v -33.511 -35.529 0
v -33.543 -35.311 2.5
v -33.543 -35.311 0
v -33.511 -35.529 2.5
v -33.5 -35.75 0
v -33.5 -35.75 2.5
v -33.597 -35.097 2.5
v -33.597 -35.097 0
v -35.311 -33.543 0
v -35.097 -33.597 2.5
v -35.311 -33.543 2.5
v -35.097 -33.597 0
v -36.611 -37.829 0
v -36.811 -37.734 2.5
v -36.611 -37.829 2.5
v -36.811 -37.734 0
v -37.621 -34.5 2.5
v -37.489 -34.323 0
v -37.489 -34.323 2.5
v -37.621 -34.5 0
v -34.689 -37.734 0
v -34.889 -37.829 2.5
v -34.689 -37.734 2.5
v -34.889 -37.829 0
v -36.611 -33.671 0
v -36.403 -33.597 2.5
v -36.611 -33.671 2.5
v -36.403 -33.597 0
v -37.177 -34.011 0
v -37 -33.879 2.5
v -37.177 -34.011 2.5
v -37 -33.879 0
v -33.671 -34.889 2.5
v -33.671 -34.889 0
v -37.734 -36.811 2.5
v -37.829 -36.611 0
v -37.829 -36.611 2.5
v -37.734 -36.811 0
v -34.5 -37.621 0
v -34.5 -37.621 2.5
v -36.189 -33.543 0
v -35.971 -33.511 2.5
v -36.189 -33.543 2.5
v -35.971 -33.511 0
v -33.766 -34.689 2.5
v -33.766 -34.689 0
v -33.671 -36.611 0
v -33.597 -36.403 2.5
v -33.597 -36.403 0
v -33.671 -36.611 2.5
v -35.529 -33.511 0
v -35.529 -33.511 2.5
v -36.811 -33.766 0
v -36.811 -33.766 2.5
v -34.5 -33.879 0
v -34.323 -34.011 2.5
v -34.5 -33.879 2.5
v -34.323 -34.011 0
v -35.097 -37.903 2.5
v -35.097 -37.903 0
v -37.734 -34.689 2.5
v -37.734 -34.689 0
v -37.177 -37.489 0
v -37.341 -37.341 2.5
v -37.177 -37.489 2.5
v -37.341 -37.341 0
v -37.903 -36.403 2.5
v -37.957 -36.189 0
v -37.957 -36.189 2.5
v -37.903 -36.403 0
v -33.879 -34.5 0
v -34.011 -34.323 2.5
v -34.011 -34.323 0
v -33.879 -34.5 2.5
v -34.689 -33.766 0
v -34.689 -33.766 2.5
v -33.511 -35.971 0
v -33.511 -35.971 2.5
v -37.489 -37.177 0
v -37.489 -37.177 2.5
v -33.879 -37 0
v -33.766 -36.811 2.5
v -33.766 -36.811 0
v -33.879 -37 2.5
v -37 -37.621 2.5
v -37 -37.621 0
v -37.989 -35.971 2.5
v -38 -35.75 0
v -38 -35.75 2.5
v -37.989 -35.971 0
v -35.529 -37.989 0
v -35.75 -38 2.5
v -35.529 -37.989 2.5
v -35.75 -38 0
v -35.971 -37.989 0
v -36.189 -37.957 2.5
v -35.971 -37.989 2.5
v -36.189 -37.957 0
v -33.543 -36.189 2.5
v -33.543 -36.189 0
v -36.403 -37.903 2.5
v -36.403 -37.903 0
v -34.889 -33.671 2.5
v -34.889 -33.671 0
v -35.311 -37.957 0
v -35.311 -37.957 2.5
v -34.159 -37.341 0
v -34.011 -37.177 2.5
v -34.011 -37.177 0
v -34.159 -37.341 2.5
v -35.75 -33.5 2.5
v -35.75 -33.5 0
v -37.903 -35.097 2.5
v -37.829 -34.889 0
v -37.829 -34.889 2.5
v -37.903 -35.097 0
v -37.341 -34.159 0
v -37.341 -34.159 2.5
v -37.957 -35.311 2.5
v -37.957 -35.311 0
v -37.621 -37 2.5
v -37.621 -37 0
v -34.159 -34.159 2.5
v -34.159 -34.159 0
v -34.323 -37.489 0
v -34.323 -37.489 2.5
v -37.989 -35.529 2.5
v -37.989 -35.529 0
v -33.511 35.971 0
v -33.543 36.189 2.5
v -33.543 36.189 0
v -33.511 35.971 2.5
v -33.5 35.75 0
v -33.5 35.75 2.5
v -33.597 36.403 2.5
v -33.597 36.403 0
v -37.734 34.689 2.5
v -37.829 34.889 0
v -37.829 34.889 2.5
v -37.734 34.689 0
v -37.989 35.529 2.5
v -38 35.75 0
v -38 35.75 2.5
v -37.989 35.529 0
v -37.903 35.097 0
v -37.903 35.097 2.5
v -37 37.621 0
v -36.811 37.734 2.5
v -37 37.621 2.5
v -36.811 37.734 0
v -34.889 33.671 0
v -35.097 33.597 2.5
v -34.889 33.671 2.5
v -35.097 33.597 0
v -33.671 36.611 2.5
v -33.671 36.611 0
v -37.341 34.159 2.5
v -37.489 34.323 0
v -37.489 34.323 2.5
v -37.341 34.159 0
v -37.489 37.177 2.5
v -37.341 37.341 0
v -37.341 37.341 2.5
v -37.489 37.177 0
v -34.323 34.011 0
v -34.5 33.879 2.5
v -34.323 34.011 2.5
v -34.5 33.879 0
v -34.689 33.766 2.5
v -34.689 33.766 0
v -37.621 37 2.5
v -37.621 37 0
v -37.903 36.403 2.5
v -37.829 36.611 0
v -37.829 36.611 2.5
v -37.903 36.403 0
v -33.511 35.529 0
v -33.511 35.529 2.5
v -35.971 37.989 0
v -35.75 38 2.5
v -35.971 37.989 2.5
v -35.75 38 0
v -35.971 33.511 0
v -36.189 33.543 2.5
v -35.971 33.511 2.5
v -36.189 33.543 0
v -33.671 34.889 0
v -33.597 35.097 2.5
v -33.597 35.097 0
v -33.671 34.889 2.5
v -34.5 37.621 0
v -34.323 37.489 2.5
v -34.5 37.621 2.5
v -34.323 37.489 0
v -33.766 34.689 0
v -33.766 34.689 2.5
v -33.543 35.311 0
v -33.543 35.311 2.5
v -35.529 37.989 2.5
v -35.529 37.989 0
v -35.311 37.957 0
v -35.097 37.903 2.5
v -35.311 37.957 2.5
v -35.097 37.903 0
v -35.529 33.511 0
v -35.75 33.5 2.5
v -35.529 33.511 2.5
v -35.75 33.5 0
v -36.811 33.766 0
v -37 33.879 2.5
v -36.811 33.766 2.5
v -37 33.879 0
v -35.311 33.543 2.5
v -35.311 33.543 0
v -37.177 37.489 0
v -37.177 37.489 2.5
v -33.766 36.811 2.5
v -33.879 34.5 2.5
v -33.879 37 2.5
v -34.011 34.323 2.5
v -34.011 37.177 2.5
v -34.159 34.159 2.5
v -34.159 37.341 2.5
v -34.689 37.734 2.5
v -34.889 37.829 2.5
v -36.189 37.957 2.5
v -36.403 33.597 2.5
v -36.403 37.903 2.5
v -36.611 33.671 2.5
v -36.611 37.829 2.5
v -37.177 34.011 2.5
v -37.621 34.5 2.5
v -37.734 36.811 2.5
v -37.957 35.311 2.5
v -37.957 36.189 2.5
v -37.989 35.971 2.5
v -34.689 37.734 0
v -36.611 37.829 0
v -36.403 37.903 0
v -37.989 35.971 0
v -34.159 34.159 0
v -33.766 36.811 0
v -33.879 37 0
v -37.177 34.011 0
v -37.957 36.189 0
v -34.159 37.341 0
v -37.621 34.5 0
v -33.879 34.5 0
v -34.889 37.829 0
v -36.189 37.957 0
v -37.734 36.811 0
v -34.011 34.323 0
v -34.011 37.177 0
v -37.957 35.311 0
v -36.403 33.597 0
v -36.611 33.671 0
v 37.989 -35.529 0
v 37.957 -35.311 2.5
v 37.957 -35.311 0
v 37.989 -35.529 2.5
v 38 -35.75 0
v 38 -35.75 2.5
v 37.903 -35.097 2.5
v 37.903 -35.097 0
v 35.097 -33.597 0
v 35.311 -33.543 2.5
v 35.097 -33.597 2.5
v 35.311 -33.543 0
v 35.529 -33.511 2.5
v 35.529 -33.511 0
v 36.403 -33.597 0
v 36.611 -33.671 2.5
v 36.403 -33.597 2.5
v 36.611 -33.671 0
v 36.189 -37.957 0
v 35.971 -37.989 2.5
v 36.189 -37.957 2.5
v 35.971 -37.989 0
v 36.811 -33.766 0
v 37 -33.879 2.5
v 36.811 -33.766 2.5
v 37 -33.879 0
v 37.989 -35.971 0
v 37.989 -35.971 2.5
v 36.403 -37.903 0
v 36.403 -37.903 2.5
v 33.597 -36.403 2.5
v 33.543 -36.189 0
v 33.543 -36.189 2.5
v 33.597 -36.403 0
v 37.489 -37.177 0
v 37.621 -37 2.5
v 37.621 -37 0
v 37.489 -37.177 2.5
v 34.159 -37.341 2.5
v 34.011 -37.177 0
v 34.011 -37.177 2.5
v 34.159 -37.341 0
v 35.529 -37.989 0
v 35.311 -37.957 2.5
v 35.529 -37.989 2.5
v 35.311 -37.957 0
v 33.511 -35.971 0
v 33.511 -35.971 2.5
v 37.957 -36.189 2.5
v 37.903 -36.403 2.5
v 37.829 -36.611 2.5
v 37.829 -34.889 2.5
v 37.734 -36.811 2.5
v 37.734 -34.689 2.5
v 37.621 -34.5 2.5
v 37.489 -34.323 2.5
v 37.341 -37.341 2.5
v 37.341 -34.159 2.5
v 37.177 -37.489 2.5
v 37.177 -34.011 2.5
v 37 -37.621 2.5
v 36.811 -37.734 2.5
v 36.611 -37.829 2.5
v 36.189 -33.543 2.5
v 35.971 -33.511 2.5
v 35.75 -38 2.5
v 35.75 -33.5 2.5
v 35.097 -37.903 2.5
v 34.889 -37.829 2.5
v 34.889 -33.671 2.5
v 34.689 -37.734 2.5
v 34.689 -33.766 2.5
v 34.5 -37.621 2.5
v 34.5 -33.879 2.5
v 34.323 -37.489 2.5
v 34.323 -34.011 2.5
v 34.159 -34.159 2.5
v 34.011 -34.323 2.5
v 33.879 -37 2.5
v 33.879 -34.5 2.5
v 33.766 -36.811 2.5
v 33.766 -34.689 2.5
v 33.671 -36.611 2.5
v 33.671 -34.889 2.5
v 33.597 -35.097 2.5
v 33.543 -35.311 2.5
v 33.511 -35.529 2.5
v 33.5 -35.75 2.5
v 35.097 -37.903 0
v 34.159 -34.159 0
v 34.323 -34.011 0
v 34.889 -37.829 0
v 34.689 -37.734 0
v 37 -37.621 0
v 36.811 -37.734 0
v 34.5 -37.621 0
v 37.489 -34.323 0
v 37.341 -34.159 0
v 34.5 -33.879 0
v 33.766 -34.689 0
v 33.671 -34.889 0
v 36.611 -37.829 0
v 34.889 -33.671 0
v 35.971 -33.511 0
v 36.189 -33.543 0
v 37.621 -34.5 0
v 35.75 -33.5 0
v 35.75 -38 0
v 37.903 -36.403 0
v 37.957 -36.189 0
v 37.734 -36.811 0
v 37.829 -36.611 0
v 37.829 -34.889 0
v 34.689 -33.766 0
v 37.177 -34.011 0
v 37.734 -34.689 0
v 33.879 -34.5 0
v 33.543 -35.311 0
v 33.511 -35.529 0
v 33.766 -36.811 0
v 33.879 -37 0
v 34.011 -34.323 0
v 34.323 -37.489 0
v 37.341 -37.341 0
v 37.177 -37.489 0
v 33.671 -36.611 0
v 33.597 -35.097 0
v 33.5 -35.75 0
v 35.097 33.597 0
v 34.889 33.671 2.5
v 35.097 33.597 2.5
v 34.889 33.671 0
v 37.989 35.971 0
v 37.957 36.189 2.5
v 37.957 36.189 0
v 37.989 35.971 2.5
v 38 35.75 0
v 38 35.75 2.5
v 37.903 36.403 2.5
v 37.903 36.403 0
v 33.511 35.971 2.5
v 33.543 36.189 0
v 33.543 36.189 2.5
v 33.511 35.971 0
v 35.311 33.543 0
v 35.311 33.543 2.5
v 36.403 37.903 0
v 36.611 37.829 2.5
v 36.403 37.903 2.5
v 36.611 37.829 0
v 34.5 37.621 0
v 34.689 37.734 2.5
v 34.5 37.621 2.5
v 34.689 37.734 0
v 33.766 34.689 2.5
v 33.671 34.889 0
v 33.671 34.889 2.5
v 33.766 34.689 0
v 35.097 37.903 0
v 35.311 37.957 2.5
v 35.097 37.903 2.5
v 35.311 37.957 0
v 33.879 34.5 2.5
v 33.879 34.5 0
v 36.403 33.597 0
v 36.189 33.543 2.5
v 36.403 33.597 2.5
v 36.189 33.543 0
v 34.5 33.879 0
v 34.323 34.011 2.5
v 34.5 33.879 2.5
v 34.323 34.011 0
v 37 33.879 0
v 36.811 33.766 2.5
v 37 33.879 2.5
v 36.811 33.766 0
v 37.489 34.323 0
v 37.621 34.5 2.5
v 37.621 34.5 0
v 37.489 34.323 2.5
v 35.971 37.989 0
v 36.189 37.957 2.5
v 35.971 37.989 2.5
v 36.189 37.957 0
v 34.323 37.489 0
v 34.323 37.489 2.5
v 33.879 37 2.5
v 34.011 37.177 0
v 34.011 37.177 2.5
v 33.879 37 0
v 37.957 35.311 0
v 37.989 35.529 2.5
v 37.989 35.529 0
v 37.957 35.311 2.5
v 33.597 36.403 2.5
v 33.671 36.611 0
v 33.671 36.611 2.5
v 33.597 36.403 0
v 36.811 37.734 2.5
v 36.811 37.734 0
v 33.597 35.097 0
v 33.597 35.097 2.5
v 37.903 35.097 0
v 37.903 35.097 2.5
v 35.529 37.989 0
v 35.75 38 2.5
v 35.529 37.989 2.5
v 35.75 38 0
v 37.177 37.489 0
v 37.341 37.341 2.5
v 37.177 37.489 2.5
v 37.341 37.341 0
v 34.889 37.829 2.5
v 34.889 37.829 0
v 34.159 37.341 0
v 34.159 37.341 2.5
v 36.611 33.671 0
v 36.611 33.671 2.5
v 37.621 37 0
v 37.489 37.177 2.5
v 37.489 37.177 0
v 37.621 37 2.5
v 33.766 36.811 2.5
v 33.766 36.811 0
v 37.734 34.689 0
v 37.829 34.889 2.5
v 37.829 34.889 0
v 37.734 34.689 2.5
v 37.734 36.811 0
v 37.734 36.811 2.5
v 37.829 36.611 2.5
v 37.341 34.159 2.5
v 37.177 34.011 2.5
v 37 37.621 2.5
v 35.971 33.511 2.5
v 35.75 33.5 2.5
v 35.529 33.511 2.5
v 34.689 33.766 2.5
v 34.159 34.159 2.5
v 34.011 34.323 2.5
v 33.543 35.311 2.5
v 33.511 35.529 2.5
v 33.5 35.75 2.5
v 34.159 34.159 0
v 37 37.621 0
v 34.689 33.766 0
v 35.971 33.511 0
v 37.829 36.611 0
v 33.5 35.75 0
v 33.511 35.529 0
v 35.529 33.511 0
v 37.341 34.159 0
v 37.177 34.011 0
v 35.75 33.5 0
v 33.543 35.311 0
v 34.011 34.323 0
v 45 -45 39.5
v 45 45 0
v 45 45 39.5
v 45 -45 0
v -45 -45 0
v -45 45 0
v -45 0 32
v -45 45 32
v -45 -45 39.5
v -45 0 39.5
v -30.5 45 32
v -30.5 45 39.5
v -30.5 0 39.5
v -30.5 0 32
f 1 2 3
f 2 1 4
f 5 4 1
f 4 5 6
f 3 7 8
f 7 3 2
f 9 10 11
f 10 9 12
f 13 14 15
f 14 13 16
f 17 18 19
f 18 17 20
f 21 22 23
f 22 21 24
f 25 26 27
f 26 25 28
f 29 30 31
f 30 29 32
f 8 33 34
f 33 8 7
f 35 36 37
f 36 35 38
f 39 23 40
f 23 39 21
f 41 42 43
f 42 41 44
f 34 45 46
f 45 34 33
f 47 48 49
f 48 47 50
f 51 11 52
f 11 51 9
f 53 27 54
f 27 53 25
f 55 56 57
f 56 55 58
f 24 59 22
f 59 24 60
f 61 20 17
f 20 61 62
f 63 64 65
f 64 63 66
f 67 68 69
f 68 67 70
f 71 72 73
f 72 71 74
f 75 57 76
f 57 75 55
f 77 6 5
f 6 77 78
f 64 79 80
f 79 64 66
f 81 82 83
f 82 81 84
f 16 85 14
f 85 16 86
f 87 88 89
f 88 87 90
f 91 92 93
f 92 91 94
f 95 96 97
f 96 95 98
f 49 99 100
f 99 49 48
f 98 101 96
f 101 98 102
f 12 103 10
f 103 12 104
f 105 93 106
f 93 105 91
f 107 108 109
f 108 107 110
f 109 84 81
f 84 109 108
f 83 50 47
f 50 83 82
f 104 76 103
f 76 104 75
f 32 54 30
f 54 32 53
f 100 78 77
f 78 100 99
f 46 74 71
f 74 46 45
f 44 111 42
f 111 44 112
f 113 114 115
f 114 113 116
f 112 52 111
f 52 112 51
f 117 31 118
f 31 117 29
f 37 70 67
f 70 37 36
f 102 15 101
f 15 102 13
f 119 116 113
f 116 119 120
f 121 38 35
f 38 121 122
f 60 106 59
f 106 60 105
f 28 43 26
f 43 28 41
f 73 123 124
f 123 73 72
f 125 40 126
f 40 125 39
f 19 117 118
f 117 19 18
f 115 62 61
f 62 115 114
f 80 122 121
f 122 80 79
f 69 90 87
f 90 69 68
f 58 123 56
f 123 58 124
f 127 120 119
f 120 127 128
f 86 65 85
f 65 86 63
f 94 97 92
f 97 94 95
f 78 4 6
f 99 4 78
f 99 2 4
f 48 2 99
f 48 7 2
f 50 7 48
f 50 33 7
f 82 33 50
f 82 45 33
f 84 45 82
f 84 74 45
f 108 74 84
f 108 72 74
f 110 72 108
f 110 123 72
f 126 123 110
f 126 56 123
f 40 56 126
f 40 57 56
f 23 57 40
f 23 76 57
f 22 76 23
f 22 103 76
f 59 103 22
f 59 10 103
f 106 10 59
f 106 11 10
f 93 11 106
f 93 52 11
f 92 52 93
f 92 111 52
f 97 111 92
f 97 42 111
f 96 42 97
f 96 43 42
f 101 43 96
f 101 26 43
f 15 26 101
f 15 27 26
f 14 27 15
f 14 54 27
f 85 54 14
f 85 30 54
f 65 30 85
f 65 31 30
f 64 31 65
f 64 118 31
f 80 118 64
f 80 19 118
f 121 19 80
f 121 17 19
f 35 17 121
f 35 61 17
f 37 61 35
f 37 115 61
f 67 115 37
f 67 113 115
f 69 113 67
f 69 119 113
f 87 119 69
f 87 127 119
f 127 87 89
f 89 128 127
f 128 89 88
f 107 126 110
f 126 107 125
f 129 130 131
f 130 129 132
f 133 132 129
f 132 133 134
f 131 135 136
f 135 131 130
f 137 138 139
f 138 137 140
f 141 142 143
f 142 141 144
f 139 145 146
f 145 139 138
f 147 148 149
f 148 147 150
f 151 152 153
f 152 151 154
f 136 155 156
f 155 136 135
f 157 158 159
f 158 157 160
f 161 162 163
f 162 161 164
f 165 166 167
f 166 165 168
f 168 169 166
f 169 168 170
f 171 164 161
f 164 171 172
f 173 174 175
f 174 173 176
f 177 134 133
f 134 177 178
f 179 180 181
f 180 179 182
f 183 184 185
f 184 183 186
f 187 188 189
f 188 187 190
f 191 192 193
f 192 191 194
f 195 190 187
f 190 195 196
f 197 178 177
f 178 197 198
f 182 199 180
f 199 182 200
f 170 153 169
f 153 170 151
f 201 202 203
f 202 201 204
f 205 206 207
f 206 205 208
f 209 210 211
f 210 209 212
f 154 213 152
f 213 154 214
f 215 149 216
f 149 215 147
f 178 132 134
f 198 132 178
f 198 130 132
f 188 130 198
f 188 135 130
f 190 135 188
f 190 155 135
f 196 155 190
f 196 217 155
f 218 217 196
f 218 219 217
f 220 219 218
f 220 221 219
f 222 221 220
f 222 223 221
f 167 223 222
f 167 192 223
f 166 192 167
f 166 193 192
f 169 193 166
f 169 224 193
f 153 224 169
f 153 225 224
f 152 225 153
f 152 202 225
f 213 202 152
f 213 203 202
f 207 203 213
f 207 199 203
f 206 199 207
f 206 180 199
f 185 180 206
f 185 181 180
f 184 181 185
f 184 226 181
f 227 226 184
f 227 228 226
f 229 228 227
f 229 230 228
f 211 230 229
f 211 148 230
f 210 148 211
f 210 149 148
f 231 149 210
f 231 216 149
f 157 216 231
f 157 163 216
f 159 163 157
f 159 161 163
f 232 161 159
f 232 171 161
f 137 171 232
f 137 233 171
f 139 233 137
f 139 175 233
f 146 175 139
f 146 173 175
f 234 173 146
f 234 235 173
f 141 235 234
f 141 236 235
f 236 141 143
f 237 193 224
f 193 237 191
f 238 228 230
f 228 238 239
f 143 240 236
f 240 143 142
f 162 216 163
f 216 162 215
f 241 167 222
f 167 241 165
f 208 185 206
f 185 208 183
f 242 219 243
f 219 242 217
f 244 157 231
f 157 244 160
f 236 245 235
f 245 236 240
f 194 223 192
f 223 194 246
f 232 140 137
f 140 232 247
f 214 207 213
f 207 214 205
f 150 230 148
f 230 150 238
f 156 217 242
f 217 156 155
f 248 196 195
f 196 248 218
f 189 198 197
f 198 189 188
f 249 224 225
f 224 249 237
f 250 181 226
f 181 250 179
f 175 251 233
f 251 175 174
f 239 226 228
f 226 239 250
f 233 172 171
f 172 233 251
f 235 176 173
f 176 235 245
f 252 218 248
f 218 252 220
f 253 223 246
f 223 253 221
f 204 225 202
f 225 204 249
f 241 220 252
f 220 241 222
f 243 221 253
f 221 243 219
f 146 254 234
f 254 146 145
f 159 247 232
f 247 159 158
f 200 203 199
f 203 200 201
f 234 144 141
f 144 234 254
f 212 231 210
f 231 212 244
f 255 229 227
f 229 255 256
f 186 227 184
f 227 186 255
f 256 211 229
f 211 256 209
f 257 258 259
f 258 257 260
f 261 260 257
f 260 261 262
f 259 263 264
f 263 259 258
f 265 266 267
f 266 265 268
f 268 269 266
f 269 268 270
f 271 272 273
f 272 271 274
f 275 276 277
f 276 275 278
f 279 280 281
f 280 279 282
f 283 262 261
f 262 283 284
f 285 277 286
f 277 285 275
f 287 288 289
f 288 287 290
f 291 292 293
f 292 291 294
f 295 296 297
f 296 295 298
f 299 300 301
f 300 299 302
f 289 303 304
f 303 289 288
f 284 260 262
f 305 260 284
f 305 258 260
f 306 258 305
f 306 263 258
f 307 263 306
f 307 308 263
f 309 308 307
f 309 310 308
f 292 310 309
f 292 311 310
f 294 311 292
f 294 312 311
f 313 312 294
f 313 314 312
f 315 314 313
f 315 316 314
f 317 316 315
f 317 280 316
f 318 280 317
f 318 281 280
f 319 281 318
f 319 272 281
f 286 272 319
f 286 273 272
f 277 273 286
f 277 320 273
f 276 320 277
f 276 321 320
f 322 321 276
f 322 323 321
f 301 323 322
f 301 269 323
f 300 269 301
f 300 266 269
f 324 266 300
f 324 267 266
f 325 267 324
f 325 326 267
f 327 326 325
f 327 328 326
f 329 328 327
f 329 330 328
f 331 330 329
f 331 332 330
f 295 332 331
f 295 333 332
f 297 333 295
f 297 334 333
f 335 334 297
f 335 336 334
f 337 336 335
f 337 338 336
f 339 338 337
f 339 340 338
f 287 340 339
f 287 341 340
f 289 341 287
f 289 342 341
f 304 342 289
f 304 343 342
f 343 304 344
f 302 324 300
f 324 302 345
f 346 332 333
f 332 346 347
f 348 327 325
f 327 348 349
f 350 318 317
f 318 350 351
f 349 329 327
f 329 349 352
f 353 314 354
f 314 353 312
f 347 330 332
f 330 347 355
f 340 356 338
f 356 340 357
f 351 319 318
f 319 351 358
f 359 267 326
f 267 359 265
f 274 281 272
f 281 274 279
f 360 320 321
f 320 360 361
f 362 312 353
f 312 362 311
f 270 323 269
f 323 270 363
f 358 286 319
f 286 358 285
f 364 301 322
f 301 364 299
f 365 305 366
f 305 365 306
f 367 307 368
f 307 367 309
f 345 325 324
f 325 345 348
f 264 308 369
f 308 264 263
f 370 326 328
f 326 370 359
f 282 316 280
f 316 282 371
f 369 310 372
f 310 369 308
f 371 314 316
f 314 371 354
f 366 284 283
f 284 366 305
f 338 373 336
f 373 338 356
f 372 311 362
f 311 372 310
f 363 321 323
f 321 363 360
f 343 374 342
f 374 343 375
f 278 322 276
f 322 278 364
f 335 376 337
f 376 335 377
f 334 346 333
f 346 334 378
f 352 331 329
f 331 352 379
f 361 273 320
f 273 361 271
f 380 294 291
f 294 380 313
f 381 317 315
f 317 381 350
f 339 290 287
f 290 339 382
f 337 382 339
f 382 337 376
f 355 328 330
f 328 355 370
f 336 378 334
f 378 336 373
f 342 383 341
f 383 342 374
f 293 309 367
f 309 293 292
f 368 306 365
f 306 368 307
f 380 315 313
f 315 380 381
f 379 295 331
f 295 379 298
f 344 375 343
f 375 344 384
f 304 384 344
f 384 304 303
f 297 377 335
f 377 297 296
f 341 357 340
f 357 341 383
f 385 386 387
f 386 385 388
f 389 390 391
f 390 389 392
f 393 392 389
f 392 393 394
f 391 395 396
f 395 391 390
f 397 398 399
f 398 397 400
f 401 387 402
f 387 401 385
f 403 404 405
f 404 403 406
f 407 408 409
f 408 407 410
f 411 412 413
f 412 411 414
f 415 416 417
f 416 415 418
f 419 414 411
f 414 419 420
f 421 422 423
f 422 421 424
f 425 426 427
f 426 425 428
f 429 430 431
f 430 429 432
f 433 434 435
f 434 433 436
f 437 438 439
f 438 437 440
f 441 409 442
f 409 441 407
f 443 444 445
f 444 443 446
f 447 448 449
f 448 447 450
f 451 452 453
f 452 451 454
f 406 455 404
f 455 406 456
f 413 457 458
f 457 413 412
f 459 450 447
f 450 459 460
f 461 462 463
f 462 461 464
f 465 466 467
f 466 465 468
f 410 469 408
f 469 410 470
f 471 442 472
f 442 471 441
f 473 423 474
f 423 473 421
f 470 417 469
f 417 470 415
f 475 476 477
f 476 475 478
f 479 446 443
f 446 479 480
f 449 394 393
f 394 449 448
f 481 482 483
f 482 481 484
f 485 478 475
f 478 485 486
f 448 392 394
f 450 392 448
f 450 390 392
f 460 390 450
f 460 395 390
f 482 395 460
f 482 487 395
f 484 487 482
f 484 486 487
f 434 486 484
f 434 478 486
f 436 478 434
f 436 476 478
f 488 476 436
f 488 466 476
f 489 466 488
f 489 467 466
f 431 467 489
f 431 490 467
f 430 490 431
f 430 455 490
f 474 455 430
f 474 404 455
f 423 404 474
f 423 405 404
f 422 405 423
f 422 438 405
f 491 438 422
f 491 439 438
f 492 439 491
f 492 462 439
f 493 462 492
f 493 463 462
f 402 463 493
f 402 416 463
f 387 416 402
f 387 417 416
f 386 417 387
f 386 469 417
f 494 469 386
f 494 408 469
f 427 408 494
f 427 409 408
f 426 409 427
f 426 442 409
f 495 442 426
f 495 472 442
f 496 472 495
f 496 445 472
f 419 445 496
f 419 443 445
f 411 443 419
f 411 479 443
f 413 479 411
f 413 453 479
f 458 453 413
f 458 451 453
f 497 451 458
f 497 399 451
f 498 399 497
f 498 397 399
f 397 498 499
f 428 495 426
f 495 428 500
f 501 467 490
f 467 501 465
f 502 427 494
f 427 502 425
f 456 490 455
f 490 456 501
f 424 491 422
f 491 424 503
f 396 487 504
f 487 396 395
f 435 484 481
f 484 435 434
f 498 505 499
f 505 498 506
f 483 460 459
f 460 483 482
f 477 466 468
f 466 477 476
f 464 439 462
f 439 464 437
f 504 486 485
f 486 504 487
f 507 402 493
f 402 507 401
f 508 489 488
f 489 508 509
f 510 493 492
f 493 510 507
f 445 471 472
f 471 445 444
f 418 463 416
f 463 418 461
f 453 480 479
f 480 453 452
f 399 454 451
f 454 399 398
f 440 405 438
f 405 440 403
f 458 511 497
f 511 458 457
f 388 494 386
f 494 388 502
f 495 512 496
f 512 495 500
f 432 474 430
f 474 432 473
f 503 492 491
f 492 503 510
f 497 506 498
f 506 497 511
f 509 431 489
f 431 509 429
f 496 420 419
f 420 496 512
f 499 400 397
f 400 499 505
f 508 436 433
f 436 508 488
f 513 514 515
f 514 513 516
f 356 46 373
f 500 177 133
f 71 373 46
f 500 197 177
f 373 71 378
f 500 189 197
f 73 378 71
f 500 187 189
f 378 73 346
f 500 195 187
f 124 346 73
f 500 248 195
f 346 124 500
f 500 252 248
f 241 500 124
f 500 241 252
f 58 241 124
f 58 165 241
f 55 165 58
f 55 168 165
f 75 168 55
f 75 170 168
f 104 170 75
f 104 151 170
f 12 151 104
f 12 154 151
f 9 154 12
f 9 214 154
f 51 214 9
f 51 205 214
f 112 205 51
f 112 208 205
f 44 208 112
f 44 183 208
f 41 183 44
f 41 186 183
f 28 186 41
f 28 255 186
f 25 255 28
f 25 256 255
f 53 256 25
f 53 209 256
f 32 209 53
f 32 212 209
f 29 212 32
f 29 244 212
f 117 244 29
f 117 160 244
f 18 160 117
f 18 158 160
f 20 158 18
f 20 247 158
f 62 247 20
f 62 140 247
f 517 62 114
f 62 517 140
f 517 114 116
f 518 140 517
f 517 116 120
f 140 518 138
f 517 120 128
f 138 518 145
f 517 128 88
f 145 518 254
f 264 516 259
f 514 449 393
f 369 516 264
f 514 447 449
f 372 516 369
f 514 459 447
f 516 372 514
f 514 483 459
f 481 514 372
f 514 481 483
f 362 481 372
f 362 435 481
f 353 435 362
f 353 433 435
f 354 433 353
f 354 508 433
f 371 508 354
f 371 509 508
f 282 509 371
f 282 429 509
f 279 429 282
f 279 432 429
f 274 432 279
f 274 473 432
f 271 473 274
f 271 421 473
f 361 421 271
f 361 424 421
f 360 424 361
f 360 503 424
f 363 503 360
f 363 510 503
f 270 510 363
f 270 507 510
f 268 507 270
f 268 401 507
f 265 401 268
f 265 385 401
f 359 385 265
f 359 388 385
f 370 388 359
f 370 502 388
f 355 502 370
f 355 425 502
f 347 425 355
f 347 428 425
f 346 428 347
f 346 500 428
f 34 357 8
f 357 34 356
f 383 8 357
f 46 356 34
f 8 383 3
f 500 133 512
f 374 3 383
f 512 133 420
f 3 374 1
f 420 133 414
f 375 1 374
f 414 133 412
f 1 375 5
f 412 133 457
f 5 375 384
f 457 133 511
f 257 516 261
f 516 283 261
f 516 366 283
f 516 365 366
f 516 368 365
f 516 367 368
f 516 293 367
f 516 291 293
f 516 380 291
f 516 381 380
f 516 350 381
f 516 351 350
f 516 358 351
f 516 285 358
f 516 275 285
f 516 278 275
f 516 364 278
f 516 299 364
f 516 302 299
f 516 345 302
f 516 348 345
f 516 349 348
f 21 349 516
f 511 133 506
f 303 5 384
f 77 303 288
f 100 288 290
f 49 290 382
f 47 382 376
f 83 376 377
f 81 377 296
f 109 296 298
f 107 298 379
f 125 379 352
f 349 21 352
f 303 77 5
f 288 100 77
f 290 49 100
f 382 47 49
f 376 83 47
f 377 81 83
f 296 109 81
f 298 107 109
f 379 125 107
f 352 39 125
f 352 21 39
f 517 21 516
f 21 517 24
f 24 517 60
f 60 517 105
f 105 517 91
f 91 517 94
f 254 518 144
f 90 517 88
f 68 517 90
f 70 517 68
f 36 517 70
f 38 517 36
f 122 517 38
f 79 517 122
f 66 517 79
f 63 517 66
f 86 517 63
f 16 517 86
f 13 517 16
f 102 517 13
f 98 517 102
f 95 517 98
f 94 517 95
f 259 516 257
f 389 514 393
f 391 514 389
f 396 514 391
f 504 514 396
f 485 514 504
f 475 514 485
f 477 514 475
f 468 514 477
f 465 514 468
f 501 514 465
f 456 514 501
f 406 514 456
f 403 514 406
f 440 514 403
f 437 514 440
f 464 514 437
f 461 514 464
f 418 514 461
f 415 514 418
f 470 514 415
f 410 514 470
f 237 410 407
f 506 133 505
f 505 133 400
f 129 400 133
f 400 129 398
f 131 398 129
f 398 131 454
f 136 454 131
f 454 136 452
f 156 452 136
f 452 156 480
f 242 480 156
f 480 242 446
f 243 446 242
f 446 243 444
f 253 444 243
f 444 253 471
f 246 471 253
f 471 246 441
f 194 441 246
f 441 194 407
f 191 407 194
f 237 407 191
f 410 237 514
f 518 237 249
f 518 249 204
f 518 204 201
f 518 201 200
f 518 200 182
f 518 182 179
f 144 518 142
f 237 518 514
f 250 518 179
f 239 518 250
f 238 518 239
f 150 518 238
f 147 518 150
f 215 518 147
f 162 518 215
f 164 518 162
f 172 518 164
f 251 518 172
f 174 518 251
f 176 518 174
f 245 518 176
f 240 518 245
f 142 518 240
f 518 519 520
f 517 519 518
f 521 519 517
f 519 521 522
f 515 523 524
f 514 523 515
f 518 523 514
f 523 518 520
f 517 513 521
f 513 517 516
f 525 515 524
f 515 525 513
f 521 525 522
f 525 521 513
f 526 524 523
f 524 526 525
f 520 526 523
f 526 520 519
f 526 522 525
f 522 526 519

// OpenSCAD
// Magnetic stirrer housing - open box covering an 80 mm PC fan
// Print orientation: top plate on bed (z = 0), walls rise to z = 40

// ---------- Parameters ----------
top_thickness   = 2;     // top plate thickness (mm)
wall_thickness  = 2.5;   // side wall thickness (mm)
open_top_z      = 40;    // height of open top / walls (mm)
outer_size      = 90;    // outer size in X and Y (mm)
screw_hole_d    = 4.5;   // M4 screw hole diameter (mm)
screw_pattern   = 71.5;  // square pitch of screw holes (mm)
notch_width     = 12;    // power cable notch width (mm)
notch_bottom_z  = 32;    // notch floor height (mm)
eps             = 0.5;   // cutter overshoot past faces (mm)

$fn = 64;

// ---------- Model ----------
difference() {
    // Solid block of the box
    translate([-outer_size/2, -outer_size/2, 0])
        cube([outer_size, outer_size, open_top_z]);

    // Open top: remove everything above z = open_top_z - eps
    translate([-outer_size/2, -outer_size/2, open_top_z - eps])
        cube([outer_size, outer_size, eps]);

    // Screw holes through the top plate, centred on the plate
    for (sx = [-screw_pattern/2, screw_pattern/2])
        for (sy = [-screw_pattern/2, screw_pattern/2])
            translate([sx, sy, -eps])
                cylinder(d = screw_hole_d, h = top_thickness + 2*eps);

    // Cable notch in one wall: 12 mm wide, centred along the wall,
    // reaching 8 mm down from the open edge (z = 32 to z = 40)
    translate([-outer_size/2 - wall_thickness, 0, notch_bottom_z])
        cube([notch_width + 2*wall_thickness, outer_size,
              open_top_z - notch_bottom_z]);
}
